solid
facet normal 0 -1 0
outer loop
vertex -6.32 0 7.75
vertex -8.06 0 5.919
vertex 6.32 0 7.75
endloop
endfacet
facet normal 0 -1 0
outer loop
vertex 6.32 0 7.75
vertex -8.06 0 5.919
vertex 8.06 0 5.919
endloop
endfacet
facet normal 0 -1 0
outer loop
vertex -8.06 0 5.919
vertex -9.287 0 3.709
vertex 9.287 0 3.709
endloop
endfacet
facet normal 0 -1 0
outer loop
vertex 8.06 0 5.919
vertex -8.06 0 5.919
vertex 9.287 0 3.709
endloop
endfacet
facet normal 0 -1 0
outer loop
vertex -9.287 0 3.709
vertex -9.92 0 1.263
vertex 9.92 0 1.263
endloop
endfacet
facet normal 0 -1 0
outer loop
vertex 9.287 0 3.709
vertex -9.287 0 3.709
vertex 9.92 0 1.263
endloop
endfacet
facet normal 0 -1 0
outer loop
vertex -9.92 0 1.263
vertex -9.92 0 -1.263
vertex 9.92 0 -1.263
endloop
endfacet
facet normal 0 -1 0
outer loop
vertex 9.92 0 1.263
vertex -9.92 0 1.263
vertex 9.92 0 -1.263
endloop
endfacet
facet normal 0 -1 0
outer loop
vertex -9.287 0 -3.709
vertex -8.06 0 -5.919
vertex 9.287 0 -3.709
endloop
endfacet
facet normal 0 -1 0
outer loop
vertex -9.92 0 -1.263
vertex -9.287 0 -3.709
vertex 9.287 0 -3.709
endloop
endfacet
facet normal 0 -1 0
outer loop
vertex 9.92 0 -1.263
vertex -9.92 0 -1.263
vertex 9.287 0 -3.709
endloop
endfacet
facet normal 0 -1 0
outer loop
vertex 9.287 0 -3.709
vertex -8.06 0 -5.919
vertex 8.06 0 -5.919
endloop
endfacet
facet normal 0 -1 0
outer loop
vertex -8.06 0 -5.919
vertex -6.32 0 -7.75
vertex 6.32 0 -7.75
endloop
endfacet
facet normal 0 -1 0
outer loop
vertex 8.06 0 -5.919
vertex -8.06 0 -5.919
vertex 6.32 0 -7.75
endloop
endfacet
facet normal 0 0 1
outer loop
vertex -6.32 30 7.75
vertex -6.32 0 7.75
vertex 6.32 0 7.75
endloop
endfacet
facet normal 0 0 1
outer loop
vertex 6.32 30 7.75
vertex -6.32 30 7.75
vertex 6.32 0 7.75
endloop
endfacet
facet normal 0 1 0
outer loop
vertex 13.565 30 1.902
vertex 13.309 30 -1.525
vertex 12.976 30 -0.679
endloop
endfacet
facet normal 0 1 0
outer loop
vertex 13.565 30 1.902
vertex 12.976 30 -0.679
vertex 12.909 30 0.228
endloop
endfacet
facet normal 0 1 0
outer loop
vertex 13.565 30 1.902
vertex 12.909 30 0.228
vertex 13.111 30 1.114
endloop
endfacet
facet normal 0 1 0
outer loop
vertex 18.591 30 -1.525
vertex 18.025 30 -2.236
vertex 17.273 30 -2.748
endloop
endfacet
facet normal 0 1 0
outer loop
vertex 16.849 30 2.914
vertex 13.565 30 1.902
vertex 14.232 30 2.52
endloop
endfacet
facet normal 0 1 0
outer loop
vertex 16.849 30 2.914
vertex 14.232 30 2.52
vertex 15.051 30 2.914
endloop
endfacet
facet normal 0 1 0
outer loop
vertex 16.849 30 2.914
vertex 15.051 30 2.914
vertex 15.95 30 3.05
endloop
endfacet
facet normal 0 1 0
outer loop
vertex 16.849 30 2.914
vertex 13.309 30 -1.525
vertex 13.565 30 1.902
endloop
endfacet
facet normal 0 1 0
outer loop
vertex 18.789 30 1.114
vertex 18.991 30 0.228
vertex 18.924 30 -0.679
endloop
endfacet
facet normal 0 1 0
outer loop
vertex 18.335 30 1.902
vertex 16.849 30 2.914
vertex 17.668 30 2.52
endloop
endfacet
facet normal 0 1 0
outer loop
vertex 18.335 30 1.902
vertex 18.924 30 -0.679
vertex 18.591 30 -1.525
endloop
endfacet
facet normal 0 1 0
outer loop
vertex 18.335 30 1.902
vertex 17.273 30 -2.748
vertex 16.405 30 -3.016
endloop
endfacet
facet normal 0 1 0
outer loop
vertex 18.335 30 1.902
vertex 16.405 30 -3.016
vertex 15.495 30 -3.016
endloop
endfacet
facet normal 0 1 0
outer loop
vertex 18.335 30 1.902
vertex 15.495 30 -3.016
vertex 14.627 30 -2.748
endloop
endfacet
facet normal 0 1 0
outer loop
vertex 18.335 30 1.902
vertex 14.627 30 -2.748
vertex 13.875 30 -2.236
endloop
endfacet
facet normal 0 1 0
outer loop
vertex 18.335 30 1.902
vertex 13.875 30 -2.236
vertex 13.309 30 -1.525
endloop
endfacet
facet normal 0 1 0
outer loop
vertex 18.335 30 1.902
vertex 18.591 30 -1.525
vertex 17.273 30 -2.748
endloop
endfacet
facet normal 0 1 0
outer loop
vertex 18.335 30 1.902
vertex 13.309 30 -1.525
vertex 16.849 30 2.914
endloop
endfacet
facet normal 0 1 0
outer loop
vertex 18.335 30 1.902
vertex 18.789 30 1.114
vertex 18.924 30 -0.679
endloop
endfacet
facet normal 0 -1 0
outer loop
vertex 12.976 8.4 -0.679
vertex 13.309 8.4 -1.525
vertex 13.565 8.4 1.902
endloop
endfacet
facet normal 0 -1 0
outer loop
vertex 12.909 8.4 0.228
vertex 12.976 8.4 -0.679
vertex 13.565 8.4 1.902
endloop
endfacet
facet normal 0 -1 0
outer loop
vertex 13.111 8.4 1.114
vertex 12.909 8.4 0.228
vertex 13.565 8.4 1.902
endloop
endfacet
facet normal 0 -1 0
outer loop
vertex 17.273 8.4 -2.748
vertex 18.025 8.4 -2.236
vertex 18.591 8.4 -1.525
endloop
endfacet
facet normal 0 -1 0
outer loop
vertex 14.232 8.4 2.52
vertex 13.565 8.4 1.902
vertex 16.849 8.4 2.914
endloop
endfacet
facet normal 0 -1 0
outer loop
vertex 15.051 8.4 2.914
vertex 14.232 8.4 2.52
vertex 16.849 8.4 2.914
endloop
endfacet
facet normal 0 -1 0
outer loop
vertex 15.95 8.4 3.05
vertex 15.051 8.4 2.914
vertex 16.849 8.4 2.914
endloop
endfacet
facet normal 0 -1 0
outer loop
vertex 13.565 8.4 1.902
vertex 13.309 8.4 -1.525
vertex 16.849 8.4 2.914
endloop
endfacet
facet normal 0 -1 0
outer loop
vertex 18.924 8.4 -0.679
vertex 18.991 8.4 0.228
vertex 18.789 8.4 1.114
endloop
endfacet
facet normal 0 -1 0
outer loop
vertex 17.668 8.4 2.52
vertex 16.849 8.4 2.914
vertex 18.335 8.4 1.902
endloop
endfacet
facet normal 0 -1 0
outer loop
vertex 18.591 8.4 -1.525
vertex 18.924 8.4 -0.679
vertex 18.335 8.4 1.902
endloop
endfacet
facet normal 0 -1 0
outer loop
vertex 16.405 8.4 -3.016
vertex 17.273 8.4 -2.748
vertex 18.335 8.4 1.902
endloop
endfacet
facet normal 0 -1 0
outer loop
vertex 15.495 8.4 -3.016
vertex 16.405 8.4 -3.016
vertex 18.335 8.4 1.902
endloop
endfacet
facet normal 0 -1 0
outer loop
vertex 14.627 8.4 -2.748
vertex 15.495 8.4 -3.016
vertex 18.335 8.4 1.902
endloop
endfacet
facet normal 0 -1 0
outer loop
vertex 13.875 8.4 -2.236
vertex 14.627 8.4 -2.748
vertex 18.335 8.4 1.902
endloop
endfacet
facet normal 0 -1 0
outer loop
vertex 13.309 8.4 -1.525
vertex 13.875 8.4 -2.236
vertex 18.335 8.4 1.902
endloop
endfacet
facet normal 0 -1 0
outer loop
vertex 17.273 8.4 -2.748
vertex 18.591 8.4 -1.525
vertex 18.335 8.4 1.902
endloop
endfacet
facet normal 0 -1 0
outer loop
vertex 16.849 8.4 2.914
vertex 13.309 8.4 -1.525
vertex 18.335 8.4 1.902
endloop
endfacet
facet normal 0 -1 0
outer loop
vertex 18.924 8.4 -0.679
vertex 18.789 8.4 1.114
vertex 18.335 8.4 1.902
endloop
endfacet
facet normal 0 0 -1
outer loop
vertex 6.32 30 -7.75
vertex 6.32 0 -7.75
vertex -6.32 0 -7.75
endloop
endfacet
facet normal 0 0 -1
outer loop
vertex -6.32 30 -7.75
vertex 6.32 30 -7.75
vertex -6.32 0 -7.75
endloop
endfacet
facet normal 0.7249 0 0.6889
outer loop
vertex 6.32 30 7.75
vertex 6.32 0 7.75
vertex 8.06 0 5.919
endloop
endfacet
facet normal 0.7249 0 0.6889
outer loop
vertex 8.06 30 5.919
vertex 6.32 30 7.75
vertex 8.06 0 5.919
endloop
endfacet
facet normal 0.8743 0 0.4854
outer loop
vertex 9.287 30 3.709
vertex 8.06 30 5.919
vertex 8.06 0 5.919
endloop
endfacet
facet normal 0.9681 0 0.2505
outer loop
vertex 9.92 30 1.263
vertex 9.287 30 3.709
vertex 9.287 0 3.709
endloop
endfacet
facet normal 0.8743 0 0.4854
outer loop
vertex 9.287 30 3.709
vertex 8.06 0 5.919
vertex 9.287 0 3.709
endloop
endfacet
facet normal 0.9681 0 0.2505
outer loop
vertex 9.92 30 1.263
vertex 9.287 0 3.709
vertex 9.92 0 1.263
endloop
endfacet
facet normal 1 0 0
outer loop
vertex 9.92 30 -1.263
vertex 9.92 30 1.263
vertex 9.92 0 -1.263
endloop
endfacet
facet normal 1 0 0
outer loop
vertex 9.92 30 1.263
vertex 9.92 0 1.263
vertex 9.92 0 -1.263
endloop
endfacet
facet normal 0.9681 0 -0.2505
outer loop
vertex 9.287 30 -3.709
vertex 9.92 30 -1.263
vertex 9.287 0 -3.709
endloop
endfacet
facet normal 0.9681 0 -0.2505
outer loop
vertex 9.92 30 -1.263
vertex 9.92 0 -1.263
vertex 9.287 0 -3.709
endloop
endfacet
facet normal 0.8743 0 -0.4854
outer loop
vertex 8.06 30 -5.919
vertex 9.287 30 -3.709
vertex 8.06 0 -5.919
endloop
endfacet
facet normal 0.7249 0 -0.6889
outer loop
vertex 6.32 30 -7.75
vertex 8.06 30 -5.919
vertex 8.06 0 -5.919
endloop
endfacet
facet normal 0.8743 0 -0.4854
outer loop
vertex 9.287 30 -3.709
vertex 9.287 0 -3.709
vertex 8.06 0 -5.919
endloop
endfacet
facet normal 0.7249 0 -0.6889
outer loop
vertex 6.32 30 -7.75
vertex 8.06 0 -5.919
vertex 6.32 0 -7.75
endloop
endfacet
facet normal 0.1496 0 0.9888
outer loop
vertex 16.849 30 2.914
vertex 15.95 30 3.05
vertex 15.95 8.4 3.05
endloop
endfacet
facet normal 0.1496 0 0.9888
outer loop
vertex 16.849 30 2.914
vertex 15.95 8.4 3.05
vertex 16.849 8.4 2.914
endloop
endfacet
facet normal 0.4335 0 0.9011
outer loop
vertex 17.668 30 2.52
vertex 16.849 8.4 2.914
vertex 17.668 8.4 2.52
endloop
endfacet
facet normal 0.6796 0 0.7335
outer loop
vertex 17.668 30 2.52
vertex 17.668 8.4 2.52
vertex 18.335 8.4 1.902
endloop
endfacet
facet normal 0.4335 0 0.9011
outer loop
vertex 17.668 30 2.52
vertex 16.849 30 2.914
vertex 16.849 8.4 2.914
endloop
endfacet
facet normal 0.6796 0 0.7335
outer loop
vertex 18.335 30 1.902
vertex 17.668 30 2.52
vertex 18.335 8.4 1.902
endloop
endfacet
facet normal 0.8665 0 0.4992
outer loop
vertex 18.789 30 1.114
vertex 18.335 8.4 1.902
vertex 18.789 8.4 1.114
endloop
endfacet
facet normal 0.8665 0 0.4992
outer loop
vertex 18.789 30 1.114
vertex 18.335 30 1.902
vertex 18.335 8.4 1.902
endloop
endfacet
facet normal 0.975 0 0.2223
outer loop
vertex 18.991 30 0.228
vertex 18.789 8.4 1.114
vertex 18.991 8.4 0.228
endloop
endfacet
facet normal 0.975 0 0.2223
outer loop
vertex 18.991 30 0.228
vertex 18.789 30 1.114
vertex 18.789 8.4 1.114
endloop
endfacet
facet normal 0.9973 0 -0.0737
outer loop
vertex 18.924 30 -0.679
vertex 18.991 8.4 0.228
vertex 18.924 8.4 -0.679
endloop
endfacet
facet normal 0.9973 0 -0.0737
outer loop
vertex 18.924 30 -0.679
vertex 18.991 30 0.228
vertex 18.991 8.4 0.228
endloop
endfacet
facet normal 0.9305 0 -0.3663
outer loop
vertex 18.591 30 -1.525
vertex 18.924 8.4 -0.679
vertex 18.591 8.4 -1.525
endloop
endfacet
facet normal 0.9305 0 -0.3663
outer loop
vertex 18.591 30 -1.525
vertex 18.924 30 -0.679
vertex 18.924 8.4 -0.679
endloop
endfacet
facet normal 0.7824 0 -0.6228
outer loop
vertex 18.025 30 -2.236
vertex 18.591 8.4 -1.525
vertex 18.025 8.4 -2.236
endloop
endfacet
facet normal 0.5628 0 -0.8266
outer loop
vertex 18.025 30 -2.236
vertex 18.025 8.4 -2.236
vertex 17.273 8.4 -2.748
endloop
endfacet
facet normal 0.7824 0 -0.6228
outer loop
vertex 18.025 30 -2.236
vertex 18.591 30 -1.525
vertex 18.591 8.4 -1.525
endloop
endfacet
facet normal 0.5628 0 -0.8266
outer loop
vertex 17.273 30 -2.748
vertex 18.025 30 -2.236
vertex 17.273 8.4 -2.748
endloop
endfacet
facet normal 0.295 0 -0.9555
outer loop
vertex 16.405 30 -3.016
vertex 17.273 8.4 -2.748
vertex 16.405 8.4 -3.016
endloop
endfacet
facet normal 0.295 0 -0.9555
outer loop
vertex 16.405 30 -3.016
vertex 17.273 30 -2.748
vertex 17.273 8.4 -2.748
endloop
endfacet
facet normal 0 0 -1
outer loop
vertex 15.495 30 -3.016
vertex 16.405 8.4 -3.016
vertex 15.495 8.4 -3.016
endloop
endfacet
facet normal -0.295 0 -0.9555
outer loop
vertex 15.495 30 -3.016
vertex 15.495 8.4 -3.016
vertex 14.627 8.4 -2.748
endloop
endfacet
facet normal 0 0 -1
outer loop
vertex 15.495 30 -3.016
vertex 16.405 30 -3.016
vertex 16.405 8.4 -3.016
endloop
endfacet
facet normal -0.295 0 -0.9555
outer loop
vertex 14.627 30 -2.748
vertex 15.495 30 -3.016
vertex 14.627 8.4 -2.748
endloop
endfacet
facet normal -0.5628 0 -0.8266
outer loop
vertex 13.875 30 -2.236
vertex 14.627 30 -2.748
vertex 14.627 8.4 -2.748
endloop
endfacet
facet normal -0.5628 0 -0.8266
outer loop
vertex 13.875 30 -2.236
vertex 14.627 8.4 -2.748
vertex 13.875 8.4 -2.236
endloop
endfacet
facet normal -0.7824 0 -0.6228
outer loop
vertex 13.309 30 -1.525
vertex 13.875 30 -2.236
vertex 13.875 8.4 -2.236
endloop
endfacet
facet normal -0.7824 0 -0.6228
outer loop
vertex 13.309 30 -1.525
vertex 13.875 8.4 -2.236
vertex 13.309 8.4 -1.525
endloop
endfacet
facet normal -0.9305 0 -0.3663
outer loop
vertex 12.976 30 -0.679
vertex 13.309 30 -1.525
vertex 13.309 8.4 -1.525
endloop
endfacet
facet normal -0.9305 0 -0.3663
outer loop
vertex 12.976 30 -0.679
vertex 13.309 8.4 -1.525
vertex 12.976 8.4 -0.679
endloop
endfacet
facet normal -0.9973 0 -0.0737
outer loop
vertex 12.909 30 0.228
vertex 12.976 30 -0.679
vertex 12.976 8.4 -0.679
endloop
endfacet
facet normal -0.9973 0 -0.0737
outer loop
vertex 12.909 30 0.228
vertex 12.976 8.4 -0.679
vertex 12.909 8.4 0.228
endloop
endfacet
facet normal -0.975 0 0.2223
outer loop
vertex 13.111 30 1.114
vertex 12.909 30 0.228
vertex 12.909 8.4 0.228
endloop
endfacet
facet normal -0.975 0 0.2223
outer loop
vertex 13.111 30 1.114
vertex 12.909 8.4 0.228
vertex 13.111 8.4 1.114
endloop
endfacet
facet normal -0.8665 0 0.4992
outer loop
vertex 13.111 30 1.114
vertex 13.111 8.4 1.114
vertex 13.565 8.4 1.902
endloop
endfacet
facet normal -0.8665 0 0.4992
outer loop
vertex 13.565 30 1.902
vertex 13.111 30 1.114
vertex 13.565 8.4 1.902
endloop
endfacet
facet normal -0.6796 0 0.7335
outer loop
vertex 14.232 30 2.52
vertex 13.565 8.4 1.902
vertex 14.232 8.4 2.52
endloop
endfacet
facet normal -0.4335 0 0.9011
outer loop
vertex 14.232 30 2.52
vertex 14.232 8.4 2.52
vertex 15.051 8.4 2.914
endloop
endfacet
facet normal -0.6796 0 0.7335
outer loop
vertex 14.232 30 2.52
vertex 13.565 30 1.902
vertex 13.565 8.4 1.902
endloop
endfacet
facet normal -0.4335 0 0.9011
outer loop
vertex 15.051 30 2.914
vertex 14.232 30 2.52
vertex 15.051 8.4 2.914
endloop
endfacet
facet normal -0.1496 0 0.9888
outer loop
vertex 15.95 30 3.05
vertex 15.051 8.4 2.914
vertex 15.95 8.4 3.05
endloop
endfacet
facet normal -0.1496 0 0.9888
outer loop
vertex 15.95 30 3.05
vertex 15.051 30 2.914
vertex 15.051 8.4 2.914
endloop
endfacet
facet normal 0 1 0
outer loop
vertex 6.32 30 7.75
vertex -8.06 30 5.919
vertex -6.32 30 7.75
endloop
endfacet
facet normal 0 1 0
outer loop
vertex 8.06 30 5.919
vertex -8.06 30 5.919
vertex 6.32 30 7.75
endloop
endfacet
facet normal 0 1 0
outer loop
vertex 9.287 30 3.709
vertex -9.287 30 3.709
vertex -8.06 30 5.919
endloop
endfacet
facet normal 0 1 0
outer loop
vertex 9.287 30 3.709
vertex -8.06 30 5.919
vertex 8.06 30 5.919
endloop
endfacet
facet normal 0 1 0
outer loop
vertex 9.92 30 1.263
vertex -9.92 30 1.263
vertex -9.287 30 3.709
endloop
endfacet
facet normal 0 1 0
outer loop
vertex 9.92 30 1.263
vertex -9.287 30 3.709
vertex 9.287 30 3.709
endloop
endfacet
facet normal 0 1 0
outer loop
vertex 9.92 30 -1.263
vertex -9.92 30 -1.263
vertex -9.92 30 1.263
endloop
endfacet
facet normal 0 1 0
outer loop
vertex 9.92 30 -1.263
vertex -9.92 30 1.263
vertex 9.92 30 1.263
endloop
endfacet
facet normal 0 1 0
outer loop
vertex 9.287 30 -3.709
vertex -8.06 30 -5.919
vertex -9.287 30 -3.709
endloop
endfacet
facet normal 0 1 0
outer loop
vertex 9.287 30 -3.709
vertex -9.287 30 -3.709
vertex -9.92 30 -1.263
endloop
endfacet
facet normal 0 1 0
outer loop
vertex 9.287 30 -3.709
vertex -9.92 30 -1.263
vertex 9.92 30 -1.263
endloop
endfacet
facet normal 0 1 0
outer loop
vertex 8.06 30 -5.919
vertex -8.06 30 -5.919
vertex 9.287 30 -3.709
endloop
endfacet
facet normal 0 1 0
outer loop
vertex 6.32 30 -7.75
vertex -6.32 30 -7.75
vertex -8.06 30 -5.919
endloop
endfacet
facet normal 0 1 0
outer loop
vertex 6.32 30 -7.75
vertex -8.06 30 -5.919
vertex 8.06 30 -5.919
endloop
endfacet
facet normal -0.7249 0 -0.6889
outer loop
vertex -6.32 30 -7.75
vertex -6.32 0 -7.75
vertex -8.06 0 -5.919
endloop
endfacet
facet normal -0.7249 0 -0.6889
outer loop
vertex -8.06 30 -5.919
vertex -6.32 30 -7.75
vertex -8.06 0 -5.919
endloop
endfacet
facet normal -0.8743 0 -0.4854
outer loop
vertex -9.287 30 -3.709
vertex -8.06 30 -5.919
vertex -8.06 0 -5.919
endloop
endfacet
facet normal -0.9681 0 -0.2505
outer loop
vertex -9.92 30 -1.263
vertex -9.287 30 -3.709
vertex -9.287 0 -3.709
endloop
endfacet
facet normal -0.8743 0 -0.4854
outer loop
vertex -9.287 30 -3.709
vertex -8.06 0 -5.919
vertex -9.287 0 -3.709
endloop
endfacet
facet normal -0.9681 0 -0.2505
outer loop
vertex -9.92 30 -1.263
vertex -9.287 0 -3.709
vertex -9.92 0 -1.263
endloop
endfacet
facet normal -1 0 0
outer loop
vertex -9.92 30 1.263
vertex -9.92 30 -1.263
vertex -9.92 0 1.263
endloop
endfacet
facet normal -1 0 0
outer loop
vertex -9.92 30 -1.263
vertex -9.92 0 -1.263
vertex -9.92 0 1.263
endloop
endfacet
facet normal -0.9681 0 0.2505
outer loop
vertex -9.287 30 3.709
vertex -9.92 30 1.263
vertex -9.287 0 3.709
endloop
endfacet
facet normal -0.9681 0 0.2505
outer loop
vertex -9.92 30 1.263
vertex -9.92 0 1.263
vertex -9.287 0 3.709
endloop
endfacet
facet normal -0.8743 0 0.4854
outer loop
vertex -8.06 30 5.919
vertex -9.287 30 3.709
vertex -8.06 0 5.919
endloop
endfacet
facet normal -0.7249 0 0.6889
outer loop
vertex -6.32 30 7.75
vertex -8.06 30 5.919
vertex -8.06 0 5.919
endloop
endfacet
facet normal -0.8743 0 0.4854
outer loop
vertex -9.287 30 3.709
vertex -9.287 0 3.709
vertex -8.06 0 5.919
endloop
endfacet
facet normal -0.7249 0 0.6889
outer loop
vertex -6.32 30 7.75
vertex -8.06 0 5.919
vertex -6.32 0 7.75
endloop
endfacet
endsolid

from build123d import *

# Parameters (mm, degrees)
RESSALTO_EXTRUS_O1_DEPTH = 30
ESBO_O3_R                = 3.05
RESSALTO_EXTRUS_O2_DEPTH = 21.6


with BuildPart() as part:
    # Esboço2 → Ressalto-extrusão1 (new body)
    with BuildSketch(Plane(origin=(0, 0, 0), x_dir=(1, 0, 0), z_dir=(0, 1, 0))):
        with BuildLine():
            Line((-6.31961233, -7.75), (6.31961233, -7.75))
            ThreePointArc((6.31961233, -7.75), (10, 0), (6.31961233, 7.75))
            Line((6.31961233, 7.75), (-6.31961233, 7.75))
            ThreePointArc((-6.31961233, 7.75), (-10, 0), (-6.31961233, -7.75))
        make_face()
    extrude(amount=RESSALTO_EXTRUS_O1_DEPTH)


with BuildPart() as body_2:
    # Esboço3 → Ressalto-extrusão2 (new body)
    with BuildSketch(Plane(origin=(0, 30, 0), x_dir=(1, 0, 0), z_dir=(0, 1, 0))):
        with Locations(Location((15.95, 0, 0), (0, 0, 270))):
            Circle(ESBO_O3_R)
    extrude(amount=-RESSALTO_EXTRUS_O2_DEPTH)


solid = Compound([part.part, body_2.part])
